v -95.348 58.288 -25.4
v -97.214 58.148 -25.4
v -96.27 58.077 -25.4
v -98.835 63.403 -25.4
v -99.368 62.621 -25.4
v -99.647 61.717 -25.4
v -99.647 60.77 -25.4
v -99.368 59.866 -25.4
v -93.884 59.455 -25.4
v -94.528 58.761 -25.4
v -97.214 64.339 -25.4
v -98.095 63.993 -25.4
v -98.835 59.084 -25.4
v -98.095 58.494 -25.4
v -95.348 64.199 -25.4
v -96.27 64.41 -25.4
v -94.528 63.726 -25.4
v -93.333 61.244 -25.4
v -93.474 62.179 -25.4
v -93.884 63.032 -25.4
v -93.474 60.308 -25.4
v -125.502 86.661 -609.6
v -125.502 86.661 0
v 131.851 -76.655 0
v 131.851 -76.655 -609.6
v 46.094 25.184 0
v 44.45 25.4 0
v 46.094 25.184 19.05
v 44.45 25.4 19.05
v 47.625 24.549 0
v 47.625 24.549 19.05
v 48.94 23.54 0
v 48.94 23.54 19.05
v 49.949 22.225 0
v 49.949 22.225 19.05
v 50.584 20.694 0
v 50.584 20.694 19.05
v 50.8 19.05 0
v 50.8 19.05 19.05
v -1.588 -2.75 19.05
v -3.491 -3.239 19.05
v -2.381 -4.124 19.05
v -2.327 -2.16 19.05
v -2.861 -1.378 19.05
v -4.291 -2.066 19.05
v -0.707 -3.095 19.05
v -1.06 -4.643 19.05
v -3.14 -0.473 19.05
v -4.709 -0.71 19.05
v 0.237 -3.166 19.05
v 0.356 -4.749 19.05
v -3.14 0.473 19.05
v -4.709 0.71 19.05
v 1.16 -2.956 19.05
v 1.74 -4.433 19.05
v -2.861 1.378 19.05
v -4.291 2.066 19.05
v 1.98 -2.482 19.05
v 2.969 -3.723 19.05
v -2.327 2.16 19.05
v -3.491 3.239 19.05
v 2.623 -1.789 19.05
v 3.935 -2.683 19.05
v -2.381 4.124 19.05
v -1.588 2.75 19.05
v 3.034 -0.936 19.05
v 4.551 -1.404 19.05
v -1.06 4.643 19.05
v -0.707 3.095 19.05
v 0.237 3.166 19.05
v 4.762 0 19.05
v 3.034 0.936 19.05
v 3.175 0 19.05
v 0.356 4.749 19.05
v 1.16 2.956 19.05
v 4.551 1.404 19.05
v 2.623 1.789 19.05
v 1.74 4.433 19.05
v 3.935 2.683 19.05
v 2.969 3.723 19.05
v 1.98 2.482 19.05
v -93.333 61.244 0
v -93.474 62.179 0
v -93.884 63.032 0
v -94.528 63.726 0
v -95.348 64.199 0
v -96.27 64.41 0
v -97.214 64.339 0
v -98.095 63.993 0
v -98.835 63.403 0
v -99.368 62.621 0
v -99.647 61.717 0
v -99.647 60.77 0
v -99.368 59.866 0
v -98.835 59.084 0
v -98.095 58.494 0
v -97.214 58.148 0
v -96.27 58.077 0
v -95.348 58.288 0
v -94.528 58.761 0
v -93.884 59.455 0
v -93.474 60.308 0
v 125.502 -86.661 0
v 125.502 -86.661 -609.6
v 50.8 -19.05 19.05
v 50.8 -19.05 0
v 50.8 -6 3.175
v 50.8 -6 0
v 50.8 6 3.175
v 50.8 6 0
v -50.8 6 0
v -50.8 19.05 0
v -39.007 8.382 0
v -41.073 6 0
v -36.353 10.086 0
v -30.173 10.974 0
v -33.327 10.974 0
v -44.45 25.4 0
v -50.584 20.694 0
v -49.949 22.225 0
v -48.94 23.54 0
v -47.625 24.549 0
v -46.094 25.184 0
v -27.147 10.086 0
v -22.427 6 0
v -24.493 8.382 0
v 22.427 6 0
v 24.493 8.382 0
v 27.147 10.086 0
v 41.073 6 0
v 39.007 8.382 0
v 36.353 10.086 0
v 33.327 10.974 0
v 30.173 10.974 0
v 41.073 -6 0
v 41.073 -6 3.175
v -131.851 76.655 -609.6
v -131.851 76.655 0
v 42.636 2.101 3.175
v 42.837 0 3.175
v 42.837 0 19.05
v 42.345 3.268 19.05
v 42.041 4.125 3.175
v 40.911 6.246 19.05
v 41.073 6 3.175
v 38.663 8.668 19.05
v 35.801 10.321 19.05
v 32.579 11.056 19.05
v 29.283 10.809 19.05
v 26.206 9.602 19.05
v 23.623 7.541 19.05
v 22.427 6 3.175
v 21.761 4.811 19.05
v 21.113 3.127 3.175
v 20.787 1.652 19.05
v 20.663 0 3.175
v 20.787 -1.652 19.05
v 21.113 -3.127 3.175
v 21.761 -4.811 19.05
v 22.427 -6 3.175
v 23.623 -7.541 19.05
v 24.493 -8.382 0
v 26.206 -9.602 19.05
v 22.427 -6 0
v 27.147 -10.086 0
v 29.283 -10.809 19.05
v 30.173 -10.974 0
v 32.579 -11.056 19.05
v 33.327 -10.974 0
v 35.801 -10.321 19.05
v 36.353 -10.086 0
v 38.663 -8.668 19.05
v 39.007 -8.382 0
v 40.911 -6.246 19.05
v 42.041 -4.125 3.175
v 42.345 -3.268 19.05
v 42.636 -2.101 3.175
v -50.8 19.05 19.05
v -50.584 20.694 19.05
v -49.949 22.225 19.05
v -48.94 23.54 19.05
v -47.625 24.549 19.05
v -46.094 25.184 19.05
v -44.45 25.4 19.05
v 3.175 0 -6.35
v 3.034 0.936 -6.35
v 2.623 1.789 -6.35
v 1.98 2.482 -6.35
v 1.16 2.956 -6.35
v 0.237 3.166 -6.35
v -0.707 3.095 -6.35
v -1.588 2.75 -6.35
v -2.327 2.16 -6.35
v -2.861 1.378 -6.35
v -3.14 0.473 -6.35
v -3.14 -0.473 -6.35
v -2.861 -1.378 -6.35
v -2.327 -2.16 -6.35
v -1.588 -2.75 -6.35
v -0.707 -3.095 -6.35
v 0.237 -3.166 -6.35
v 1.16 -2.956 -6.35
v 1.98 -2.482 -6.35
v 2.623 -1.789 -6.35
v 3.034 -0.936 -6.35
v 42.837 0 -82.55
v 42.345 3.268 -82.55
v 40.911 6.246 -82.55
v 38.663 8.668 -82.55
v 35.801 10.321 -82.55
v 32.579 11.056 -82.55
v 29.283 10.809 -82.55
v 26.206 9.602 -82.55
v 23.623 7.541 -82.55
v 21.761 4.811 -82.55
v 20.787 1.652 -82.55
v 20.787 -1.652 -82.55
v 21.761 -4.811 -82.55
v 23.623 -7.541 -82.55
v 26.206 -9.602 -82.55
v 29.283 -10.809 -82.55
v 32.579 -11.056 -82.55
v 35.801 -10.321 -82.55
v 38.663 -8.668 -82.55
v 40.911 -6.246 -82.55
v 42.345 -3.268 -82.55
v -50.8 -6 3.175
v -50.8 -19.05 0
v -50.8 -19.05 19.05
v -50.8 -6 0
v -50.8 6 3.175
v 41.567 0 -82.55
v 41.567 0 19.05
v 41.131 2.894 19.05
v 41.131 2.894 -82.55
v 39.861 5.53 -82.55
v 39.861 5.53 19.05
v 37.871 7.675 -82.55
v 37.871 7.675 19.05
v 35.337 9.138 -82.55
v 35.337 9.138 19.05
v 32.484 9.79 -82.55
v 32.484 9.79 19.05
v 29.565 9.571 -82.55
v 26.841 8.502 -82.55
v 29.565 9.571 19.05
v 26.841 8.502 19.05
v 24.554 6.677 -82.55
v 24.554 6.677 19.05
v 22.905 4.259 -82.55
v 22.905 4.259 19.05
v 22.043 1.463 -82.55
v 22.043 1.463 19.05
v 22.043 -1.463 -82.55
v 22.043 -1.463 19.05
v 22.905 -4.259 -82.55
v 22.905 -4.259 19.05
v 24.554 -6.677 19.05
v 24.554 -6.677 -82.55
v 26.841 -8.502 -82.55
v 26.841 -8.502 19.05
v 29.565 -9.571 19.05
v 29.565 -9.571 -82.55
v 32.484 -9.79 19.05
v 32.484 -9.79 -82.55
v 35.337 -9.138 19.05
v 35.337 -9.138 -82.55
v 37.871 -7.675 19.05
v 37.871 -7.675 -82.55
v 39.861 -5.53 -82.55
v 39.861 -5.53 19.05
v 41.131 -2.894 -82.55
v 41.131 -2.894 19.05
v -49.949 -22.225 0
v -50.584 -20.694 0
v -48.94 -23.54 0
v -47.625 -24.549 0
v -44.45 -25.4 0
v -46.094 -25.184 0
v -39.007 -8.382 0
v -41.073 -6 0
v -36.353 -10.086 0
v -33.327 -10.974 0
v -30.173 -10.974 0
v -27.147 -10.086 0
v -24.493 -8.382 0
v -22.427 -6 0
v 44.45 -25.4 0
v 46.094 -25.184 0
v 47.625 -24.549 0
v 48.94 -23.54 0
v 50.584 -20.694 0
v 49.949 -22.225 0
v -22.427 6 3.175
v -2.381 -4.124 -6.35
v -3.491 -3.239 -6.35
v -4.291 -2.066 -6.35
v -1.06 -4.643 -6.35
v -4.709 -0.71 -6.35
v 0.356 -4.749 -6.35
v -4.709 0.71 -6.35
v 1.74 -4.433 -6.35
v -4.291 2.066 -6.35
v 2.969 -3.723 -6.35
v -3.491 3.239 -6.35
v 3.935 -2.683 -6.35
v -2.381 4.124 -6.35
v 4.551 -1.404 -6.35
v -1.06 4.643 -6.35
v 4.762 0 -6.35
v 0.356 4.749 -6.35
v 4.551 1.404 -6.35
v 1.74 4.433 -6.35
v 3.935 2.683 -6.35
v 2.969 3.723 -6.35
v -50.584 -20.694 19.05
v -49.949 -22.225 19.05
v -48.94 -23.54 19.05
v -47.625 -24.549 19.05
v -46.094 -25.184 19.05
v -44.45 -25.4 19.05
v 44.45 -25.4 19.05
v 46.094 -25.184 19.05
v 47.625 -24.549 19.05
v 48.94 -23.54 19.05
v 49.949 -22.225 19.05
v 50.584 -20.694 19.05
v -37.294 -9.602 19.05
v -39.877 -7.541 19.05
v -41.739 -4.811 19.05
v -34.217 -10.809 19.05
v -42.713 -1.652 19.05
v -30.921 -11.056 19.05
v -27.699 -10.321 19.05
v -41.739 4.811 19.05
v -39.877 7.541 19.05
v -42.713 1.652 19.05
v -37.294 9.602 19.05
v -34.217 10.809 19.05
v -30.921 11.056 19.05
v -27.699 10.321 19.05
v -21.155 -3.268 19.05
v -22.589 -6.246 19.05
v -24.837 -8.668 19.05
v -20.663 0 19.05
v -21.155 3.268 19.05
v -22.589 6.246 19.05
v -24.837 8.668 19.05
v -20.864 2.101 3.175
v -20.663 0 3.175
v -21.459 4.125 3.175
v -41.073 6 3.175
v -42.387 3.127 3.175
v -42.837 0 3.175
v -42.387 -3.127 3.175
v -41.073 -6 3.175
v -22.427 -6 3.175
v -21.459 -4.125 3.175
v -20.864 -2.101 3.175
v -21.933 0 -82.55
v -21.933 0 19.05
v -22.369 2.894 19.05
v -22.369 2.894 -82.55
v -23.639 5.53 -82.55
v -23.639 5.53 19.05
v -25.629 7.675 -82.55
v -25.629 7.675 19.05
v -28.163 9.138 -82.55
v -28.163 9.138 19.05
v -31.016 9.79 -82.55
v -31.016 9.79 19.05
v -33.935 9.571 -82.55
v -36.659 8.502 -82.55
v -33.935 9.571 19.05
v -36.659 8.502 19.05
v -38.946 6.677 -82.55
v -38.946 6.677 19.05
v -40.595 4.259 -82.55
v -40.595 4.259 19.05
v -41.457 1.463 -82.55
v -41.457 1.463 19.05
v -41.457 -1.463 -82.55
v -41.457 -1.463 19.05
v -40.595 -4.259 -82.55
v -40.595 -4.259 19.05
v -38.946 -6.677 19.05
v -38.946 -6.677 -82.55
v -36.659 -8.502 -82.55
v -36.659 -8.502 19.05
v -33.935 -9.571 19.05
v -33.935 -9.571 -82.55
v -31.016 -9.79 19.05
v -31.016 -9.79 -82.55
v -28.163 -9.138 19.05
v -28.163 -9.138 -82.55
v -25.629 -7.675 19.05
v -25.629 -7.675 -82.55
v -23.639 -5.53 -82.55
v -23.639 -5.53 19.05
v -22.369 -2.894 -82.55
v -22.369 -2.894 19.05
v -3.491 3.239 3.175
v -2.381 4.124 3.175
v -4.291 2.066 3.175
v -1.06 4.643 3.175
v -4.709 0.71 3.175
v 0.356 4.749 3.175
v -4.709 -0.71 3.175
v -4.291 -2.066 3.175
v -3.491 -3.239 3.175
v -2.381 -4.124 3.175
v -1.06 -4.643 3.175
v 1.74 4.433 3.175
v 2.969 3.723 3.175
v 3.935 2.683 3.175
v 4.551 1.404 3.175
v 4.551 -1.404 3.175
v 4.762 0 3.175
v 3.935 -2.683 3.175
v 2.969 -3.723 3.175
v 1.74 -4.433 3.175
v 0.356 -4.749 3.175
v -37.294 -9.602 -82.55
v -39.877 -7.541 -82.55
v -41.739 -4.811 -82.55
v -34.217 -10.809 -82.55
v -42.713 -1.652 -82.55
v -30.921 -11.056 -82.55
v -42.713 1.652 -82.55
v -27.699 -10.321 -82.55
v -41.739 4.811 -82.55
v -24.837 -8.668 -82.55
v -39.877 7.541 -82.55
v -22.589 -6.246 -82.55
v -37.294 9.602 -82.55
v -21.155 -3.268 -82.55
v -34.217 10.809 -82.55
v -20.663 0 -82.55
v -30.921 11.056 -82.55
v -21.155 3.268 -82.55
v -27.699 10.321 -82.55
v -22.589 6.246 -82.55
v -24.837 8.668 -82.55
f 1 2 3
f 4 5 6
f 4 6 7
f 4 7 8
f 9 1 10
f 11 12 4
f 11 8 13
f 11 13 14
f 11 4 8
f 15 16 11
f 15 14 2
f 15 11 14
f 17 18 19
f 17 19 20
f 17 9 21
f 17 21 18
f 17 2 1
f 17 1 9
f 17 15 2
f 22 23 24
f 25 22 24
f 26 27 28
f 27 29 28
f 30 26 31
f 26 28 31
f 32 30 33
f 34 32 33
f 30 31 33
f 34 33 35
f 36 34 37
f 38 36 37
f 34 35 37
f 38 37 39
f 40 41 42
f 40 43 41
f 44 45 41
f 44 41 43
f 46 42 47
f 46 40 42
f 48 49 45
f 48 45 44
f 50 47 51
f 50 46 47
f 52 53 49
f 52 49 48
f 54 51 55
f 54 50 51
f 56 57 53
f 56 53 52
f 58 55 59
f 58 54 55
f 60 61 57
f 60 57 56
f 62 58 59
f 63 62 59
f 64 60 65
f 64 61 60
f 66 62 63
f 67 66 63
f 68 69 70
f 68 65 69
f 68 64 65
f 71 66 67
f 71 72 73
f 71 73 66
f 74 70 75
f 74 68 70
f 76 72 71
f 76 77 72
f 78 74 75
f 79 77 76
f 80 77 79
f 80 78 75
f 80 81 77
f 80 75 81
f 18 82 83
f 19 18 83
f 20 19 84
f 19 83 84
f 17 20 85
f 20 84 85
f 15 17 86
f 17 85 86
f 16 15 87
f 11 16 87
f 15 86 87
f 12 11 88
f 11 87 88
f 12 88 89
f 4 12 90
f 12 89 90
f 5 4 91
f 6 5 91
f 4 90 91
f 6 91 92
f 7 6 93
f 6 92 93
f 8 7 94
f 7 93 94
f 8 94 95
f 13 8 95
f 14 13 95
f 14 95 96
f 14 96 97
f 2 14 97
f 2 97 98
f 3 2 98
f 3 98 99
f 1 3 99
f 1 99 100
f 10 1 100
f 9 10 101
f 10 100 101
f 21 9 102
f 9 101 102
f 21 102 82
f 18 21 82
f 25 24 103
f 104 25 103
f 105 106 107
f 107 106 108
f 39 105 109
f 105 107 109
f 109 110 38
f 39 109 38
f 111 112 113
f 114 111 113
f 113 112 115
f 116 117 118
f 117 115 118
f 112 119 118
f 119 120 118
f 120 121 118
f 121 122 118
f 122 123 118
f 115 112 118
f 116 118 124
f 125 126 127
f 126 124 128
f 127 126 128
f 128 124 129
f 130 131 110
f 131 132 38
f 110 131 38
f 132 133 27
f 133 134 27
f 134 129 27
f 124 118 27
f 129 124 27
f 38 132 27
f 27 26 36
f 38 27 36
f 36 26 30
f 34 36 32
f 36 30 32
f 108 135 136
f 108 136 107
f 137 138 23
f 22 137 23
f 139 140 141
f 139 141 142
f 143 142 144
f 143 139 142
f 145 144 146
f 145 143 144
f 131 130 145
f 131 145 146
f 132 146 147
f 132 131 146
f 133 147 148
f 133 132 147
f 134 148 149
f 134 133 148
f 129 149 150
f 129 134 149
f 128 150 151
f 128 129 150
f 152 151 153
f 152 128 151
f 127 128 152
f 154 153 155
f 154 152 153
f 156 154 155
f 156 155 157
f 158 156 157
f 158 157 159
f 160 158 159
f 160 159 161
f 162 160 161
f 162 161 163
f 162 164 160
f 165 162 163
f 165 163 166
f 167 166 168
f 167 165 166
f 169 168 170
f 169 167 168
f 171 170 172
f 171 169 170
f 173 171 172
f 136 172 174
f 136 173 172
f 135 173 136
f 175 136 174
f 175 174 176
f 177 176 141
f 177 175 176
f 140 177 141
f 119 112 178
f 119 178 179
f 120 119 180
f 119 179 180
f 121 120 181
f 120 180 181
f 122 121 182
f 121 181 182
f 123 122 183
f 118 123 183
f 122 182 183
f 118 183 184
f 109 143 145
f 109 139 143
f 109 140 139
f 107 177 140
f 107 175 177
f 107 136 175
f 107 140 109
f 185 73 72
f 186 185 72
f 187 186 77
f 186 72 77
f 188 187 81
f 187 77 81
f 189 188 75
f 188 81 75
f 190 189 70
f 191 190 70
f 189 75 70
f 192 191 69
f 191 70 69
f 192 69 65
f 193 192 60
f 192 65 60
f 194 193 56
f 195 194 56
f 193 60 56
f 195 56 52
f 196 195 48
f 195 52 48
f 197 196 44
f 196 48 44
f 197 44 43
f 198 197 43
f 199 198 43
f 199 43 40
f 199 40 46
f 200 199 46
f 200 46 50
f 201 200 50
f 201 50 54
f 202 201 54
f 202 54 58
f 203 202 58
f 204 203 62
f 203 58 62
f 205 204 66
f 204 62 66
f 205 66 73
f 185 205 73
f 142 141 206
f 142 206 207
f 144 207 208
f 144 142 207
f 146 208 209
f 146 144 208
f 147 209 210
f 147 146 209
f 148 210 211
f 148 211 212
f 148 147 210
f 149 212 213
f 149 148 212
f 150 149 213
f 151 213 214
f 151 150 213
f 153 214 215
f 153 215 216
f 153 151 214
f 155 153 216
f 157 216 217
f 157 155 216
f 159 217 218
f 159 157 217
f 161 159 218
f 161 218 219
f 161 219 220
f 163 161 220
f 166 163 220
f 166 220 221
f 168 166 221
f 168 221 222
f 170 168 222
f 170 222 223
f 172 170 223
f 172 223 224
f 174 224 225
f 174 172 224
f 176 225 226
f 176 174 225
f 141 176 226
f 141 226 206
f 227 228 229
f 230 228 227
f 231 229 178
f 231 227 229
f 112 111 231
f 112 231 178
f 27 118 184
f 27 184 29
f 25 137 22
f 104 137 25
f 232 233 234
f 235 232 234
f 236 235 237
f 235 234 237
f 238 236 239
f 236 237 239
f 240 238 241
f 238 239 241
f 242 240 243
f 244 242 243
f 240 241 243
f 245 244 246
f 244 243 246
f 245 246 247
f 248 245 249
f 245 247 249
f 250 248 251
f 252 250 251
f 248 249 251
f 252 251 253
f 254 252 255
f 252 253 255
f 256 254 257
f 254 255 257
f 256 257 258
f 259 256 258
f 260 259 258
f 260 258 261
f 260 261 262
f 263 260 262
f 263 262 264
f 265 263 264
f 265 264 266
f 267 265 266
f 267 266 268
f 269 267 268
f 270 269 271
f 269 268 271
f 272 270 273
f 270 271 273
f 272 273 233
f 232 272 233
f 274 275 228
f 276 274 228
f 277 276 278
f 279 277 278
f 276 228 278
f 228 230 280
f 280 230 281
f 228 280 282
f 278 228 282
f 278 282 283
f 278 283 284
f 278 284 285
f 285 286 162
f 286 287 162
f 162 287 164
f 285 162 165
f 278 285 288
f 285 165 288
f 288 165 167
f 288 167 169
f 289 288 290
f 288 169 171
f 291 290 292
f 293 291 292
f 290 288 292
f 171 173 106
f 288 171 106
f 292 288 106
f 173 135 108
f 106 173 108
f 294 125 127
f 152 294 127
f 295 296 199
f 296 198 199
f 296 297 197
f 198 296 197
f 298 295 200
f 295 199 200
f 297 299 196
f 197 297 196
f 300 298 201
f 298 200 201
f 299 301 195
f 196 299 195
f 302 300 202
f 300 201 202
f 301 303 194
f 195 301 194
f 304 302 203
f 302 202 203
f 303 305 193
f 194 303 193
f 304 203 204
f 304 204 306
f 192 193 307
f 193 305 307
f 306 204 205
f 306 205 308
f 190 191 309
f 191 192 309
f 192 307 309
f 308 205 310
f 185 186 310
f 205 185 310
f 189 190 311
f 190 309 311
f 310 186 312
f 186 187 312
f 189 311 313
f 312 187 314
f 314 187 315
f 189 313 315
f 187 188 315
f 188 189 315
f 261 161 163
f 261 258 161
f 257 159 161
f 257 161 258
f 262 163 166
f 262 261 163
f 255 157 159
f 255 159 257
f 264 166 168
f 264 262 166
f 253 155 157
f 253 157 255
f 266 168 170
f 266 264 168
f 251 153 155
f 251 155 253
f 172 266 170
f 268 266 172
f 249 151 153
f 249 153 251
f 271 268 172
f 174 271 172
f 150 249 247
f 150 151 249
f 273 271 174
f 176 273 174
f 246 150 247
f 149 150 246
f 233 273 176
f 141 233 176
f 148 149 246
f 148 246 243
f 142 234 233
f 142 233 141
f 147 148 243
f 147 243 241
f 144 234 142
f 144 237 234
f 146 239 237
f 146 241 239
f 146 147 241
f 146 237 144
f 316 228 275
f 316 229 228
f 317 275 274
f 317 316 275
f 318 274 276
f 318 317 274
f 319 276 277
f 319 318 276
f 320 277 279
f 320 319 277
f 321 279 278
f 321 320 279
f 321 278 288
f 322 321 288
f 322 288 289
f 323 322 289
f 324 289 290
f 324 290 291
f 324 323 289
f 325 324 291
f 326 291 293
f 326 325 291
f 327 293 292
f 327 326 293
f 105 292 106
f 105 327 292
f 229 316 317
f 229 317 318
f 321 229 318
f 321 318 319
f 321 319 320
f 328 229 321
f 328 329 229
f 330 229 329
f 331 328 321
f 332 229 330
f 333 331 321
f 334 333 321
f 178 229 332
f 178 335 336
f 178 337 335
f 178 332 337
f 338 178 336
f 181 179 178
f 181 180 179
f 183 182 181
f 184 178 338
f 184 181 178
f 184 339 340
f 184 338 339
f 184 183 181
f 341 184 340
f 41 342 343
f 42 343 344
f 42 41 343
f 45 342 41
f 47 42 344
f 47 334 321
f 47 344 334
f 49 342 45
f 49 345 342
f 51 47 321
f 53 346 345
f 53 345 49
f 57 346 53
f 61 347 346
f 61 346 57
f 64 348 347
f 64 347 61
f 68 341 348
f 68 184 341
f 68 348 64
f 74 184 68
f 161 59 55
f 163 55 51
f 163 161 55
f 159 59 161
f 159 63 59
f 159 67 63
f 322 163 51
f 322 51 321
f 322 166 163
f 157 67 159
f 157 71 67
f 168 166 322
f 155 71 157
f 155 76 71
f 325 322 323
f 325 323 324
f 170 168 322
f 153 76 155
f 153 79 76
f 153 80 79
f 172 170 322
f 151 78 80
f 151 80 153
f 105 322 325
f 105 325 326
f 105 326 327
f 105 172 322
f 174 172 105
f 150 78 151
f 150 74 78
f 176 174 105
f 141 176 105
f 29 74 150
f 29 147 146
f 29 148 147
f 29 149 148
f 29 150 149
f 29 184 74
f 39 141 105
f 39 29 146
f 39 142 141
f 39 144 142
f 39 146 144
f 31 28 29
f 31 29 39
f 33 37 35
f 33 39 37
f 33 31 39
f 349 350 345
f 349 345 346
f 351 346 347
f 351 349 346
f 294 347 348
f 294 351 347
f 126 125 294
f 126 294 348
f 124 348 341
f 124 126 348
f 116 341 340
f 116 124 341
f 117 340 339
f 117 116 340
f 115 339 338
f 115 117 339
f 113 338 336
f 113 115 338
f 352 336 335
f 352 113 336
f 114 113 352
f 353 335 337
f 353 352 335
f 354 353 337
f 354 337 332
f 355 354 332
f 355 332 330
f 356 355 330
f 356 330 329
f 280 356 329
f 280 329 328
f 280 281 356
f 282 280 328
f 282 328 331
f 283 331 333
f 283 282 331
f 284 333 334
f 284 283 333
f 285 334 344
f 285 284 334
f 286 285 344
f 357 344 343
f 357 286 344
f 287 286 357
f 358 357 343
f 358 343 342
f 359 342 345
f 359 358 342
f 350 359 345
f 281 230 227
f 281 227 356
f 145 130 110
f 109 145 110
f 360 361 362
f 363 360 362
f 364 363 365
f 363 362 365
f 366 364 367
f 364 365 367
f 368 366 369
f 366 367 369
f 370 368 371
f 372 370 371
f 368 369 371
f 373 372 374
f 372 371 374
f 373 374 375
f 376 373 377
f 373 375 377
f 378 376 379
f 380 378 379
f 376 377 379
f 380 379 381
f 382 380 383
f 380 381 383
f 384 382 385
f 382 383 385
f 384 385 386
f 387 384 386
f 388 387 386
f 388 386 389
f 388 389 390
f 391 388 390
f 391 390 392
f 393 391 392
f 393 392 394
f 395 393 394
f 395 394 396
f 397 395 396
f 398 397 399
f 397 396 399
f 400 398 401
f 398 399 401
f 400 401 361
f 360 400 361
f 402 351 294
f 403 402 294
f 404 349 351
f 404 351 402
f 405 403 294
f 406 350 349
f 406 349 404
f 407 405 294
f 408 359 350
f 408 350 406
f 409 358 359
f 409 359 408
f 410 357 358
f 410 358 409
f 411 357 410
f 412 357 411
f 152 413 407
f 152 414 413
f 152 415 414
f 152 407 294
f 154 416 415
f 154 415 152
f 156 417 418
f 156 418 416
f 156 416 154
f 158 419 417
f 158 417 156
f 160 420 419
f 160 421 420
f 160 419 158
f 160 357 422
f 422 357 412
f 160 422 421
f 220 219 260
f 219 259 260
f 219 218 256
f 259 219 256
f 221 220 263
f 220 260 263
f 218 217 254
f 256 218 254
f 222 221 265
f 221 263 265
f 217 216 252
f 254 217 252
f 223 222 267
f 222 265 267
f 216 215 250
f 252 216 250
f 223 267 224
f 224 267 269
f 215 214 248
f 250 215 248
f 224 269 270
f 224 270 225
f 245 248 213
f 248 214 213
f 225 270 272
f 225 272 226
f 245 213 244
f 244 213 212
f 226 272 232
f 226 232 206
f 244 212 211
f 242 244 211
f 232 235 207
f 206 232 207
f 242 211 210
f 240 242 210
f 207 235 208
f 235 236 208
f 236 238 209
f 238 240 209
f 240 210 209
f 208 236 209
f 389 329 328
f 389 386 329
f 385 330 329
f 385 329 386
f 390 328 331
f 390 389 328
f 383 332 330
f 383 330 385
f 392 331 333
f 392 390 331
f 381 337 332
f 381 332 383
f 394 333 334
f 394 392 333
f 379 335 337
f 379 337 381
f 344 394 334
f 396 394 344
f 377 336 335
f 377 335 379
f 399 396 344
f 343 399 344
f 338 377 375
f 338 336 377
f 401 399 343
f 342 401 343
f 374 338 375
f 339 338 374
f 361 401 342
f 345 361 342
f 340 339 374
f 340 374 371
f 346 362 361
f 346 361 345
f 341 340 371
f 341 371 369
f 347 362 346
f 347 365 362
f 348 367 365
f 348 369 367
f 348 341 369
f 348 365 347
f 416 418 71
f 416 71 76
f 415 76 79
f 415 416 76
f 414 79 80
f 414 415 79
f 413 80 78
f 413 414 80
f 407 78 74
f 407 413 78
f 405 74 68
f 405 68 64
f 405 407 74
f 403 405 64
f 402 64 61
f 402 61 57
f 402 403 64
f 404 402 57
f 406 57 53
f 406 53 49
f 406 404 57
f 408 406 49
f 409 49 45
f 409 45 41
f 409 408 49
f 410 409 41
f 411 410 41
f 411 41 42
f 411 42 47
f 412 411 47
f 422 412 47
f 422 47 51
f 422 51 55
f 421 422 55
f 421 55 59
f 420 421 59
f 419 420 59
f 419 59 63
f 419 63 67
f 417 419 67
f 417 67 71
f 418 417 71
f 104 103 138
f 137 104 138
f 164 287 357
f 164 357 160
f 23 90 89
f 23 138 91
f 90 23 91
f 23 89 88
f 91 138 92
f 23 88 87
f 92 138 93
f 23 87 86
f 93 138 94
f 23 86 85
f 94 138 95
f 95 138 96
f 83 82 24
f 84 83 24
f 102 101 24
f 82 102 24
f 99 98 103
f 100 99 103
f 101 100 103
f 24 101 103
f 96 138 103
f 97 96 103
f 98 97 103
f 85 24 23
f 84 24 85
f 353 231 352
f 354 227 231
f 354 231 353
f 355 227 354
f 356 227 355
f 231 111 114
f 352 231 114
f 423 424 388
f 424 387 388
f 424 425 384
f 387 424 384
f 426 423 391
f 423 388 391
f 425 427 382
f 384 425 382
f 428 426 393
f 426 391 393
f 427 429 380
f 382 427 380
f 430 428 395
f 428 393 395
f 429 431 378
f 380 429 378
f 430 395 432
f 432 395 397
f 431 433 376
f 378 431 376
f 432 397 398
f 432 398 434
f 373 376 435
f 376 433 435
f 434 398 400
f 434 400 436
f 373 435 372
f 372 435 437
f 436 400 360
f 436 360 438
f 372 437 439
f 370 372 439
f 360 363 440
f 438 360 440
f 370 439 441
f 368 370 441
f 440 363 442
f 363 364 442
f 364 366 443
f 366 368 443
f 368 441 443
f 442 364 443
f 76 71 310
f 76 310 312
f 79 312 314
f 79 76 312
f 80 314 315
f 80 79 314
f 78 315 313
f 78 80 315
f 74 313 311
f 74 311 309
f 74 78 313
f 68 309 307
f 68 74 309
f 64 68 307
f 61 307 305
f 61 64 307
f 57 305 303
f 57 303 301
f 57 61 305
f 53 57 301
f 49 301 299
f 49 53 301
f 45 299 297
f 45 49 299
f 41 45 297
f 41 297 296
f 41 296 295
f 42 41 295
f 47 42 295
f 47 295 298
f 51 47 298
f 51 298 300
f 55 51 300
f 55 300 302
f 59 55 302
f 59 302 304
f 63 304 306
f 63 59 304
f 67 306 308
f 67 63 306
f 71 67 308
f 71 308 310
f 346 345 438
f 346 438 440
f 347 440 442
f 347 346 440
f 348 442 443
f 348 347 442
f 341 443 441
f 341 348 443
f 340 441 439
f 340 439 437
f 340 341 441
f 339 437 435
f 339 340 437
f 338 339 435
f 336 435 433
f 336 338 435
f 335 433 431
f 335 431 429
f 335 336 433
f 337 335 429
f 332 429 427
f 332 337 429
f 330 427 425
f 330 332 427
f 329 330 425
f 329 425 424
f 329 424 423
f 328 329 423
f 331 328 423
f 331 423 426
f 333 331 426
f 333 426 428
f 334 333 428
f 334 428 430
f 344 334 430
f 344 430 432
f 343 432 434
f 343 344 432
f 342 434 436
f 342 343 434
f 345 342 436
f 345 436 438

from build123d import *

# Parameters (mm, degrees)
F0_W      = 101.6
F0_H      = 50.8
F0_R      = 11.0871
F0_R_2    = 4.7625
F1_DEPTH  = 19.05
F2_R      = 11.0871
F2_R_2    = 9.8171
F3_DEPTH  = 101.6
F4_R      = 4.7625
F4_R_2    = 3.175
F5_DEPTH  = 25.4
F6_R      = 6.35
F8_DEPTH  = 609.6
F9_R      = 3.175
F10_DEPTH = 25.4
F11_W     = 101.6
F11_H     = 12
F12_DEPTH = 3.175


with BuildPart() as f1:
    # F0 (on Top) → F1 (new body)
    with BuildSketch(Plane.XY):
        Rectangle(F0_W, F0_H)
        with Locations((-31.75, 0)):
            Circle(F0_R, mode=Mode.SUBTRACT)
        Circle(F0_R_2, mode=Mode.SUBTRACT)
        with Locations((31.75, 0)):
            Circle(F0_R, mode=Mode.SUBTRACT)
    extrude(amount=F1_DEPTH)

    # F6
    f6_edges = [f1.edges().sort_by_distance(p)[0] for p in [
        (-50.8, -25.4, 9.525),
        (-50.8, 25.4, 9.525),
        (50.8, -25.4, 9.525),
        (50.8, 25.4, 9.525),
    ]]
    fillet(f6_edges, radius=F6_R)

    # F11 (on face) → F12 (cut)
    with BuildSketch(Plane(origin=(0, 0, 0), x_dir=(1, 0, 0), z_dir=(0, 0, -1))):
        Rectangle(F11_W, F11_H)
    extrude(amount=-F12_DEPTH, mode=Mode.SUBTRACT)


with BuildPart() as f3:
    # F2 (on face) → F3 (new body)
    with BuildSketch(Plane.XY.offset(19.05)):
        with Locations((-31.75, 0)):
            Circle(F2_R)
        with Locations((-31.75, 0)):
            Circle(F2_R_2, mode=Mode.SUBTRACT)
    extrude(amount=-F3_DEPTH)


with BuildPart() as f3b:
    # F2 (on face) → F3, piece 2 (new body)
    with BuildSketch(Plane.XY.offset(19.05)):
        with Locations((31.75, 0)):
            Circle(F2_R)
        with Locations((31.75, 0)):
            Circle(F2_R_2, mode=Mode.SUBTRACT)
    extrude(amount=-F3_DEPTH)


with BuildPart() as f5:
    # F4 (on face) → F5 (new body)
    with BuildSketch(Plane.XY.offset(19.05)):
        Circle(F4_R)
        Circle(F4_R_2, mode=Mode.SUBTRACT)
    extrude(amount=-F5_DEPTH)


with BuildPart() as f8:
    # F7 (on face) → F8 (new body)
    with BuildSketch(Plane(origin=(0, 0, 0), x_dir=(1, 0, 0), z_dir=(0, 0, -1))):
        Polygon((125.502097575, 86.6607704171), (-131.8514955277, -76.6553895829), (-125.502097575, -86.6607704171), (131.8514955277, 76.6553895829), align=None)
    extrude(amount=F8_DEPTH)

    # F9 (on face) → F10 (cut)
    with BuildSketch(Plane.XY):
        with Locations((-96.5075974135, 61.24356)):
            Circle(F9_R)
    extrude(amount=-F10_DEPTH, mode=Mode.SUBTRACT)


solid = Compound([f1.part, f3.part, f3b.part, f5.part, f8.part])
